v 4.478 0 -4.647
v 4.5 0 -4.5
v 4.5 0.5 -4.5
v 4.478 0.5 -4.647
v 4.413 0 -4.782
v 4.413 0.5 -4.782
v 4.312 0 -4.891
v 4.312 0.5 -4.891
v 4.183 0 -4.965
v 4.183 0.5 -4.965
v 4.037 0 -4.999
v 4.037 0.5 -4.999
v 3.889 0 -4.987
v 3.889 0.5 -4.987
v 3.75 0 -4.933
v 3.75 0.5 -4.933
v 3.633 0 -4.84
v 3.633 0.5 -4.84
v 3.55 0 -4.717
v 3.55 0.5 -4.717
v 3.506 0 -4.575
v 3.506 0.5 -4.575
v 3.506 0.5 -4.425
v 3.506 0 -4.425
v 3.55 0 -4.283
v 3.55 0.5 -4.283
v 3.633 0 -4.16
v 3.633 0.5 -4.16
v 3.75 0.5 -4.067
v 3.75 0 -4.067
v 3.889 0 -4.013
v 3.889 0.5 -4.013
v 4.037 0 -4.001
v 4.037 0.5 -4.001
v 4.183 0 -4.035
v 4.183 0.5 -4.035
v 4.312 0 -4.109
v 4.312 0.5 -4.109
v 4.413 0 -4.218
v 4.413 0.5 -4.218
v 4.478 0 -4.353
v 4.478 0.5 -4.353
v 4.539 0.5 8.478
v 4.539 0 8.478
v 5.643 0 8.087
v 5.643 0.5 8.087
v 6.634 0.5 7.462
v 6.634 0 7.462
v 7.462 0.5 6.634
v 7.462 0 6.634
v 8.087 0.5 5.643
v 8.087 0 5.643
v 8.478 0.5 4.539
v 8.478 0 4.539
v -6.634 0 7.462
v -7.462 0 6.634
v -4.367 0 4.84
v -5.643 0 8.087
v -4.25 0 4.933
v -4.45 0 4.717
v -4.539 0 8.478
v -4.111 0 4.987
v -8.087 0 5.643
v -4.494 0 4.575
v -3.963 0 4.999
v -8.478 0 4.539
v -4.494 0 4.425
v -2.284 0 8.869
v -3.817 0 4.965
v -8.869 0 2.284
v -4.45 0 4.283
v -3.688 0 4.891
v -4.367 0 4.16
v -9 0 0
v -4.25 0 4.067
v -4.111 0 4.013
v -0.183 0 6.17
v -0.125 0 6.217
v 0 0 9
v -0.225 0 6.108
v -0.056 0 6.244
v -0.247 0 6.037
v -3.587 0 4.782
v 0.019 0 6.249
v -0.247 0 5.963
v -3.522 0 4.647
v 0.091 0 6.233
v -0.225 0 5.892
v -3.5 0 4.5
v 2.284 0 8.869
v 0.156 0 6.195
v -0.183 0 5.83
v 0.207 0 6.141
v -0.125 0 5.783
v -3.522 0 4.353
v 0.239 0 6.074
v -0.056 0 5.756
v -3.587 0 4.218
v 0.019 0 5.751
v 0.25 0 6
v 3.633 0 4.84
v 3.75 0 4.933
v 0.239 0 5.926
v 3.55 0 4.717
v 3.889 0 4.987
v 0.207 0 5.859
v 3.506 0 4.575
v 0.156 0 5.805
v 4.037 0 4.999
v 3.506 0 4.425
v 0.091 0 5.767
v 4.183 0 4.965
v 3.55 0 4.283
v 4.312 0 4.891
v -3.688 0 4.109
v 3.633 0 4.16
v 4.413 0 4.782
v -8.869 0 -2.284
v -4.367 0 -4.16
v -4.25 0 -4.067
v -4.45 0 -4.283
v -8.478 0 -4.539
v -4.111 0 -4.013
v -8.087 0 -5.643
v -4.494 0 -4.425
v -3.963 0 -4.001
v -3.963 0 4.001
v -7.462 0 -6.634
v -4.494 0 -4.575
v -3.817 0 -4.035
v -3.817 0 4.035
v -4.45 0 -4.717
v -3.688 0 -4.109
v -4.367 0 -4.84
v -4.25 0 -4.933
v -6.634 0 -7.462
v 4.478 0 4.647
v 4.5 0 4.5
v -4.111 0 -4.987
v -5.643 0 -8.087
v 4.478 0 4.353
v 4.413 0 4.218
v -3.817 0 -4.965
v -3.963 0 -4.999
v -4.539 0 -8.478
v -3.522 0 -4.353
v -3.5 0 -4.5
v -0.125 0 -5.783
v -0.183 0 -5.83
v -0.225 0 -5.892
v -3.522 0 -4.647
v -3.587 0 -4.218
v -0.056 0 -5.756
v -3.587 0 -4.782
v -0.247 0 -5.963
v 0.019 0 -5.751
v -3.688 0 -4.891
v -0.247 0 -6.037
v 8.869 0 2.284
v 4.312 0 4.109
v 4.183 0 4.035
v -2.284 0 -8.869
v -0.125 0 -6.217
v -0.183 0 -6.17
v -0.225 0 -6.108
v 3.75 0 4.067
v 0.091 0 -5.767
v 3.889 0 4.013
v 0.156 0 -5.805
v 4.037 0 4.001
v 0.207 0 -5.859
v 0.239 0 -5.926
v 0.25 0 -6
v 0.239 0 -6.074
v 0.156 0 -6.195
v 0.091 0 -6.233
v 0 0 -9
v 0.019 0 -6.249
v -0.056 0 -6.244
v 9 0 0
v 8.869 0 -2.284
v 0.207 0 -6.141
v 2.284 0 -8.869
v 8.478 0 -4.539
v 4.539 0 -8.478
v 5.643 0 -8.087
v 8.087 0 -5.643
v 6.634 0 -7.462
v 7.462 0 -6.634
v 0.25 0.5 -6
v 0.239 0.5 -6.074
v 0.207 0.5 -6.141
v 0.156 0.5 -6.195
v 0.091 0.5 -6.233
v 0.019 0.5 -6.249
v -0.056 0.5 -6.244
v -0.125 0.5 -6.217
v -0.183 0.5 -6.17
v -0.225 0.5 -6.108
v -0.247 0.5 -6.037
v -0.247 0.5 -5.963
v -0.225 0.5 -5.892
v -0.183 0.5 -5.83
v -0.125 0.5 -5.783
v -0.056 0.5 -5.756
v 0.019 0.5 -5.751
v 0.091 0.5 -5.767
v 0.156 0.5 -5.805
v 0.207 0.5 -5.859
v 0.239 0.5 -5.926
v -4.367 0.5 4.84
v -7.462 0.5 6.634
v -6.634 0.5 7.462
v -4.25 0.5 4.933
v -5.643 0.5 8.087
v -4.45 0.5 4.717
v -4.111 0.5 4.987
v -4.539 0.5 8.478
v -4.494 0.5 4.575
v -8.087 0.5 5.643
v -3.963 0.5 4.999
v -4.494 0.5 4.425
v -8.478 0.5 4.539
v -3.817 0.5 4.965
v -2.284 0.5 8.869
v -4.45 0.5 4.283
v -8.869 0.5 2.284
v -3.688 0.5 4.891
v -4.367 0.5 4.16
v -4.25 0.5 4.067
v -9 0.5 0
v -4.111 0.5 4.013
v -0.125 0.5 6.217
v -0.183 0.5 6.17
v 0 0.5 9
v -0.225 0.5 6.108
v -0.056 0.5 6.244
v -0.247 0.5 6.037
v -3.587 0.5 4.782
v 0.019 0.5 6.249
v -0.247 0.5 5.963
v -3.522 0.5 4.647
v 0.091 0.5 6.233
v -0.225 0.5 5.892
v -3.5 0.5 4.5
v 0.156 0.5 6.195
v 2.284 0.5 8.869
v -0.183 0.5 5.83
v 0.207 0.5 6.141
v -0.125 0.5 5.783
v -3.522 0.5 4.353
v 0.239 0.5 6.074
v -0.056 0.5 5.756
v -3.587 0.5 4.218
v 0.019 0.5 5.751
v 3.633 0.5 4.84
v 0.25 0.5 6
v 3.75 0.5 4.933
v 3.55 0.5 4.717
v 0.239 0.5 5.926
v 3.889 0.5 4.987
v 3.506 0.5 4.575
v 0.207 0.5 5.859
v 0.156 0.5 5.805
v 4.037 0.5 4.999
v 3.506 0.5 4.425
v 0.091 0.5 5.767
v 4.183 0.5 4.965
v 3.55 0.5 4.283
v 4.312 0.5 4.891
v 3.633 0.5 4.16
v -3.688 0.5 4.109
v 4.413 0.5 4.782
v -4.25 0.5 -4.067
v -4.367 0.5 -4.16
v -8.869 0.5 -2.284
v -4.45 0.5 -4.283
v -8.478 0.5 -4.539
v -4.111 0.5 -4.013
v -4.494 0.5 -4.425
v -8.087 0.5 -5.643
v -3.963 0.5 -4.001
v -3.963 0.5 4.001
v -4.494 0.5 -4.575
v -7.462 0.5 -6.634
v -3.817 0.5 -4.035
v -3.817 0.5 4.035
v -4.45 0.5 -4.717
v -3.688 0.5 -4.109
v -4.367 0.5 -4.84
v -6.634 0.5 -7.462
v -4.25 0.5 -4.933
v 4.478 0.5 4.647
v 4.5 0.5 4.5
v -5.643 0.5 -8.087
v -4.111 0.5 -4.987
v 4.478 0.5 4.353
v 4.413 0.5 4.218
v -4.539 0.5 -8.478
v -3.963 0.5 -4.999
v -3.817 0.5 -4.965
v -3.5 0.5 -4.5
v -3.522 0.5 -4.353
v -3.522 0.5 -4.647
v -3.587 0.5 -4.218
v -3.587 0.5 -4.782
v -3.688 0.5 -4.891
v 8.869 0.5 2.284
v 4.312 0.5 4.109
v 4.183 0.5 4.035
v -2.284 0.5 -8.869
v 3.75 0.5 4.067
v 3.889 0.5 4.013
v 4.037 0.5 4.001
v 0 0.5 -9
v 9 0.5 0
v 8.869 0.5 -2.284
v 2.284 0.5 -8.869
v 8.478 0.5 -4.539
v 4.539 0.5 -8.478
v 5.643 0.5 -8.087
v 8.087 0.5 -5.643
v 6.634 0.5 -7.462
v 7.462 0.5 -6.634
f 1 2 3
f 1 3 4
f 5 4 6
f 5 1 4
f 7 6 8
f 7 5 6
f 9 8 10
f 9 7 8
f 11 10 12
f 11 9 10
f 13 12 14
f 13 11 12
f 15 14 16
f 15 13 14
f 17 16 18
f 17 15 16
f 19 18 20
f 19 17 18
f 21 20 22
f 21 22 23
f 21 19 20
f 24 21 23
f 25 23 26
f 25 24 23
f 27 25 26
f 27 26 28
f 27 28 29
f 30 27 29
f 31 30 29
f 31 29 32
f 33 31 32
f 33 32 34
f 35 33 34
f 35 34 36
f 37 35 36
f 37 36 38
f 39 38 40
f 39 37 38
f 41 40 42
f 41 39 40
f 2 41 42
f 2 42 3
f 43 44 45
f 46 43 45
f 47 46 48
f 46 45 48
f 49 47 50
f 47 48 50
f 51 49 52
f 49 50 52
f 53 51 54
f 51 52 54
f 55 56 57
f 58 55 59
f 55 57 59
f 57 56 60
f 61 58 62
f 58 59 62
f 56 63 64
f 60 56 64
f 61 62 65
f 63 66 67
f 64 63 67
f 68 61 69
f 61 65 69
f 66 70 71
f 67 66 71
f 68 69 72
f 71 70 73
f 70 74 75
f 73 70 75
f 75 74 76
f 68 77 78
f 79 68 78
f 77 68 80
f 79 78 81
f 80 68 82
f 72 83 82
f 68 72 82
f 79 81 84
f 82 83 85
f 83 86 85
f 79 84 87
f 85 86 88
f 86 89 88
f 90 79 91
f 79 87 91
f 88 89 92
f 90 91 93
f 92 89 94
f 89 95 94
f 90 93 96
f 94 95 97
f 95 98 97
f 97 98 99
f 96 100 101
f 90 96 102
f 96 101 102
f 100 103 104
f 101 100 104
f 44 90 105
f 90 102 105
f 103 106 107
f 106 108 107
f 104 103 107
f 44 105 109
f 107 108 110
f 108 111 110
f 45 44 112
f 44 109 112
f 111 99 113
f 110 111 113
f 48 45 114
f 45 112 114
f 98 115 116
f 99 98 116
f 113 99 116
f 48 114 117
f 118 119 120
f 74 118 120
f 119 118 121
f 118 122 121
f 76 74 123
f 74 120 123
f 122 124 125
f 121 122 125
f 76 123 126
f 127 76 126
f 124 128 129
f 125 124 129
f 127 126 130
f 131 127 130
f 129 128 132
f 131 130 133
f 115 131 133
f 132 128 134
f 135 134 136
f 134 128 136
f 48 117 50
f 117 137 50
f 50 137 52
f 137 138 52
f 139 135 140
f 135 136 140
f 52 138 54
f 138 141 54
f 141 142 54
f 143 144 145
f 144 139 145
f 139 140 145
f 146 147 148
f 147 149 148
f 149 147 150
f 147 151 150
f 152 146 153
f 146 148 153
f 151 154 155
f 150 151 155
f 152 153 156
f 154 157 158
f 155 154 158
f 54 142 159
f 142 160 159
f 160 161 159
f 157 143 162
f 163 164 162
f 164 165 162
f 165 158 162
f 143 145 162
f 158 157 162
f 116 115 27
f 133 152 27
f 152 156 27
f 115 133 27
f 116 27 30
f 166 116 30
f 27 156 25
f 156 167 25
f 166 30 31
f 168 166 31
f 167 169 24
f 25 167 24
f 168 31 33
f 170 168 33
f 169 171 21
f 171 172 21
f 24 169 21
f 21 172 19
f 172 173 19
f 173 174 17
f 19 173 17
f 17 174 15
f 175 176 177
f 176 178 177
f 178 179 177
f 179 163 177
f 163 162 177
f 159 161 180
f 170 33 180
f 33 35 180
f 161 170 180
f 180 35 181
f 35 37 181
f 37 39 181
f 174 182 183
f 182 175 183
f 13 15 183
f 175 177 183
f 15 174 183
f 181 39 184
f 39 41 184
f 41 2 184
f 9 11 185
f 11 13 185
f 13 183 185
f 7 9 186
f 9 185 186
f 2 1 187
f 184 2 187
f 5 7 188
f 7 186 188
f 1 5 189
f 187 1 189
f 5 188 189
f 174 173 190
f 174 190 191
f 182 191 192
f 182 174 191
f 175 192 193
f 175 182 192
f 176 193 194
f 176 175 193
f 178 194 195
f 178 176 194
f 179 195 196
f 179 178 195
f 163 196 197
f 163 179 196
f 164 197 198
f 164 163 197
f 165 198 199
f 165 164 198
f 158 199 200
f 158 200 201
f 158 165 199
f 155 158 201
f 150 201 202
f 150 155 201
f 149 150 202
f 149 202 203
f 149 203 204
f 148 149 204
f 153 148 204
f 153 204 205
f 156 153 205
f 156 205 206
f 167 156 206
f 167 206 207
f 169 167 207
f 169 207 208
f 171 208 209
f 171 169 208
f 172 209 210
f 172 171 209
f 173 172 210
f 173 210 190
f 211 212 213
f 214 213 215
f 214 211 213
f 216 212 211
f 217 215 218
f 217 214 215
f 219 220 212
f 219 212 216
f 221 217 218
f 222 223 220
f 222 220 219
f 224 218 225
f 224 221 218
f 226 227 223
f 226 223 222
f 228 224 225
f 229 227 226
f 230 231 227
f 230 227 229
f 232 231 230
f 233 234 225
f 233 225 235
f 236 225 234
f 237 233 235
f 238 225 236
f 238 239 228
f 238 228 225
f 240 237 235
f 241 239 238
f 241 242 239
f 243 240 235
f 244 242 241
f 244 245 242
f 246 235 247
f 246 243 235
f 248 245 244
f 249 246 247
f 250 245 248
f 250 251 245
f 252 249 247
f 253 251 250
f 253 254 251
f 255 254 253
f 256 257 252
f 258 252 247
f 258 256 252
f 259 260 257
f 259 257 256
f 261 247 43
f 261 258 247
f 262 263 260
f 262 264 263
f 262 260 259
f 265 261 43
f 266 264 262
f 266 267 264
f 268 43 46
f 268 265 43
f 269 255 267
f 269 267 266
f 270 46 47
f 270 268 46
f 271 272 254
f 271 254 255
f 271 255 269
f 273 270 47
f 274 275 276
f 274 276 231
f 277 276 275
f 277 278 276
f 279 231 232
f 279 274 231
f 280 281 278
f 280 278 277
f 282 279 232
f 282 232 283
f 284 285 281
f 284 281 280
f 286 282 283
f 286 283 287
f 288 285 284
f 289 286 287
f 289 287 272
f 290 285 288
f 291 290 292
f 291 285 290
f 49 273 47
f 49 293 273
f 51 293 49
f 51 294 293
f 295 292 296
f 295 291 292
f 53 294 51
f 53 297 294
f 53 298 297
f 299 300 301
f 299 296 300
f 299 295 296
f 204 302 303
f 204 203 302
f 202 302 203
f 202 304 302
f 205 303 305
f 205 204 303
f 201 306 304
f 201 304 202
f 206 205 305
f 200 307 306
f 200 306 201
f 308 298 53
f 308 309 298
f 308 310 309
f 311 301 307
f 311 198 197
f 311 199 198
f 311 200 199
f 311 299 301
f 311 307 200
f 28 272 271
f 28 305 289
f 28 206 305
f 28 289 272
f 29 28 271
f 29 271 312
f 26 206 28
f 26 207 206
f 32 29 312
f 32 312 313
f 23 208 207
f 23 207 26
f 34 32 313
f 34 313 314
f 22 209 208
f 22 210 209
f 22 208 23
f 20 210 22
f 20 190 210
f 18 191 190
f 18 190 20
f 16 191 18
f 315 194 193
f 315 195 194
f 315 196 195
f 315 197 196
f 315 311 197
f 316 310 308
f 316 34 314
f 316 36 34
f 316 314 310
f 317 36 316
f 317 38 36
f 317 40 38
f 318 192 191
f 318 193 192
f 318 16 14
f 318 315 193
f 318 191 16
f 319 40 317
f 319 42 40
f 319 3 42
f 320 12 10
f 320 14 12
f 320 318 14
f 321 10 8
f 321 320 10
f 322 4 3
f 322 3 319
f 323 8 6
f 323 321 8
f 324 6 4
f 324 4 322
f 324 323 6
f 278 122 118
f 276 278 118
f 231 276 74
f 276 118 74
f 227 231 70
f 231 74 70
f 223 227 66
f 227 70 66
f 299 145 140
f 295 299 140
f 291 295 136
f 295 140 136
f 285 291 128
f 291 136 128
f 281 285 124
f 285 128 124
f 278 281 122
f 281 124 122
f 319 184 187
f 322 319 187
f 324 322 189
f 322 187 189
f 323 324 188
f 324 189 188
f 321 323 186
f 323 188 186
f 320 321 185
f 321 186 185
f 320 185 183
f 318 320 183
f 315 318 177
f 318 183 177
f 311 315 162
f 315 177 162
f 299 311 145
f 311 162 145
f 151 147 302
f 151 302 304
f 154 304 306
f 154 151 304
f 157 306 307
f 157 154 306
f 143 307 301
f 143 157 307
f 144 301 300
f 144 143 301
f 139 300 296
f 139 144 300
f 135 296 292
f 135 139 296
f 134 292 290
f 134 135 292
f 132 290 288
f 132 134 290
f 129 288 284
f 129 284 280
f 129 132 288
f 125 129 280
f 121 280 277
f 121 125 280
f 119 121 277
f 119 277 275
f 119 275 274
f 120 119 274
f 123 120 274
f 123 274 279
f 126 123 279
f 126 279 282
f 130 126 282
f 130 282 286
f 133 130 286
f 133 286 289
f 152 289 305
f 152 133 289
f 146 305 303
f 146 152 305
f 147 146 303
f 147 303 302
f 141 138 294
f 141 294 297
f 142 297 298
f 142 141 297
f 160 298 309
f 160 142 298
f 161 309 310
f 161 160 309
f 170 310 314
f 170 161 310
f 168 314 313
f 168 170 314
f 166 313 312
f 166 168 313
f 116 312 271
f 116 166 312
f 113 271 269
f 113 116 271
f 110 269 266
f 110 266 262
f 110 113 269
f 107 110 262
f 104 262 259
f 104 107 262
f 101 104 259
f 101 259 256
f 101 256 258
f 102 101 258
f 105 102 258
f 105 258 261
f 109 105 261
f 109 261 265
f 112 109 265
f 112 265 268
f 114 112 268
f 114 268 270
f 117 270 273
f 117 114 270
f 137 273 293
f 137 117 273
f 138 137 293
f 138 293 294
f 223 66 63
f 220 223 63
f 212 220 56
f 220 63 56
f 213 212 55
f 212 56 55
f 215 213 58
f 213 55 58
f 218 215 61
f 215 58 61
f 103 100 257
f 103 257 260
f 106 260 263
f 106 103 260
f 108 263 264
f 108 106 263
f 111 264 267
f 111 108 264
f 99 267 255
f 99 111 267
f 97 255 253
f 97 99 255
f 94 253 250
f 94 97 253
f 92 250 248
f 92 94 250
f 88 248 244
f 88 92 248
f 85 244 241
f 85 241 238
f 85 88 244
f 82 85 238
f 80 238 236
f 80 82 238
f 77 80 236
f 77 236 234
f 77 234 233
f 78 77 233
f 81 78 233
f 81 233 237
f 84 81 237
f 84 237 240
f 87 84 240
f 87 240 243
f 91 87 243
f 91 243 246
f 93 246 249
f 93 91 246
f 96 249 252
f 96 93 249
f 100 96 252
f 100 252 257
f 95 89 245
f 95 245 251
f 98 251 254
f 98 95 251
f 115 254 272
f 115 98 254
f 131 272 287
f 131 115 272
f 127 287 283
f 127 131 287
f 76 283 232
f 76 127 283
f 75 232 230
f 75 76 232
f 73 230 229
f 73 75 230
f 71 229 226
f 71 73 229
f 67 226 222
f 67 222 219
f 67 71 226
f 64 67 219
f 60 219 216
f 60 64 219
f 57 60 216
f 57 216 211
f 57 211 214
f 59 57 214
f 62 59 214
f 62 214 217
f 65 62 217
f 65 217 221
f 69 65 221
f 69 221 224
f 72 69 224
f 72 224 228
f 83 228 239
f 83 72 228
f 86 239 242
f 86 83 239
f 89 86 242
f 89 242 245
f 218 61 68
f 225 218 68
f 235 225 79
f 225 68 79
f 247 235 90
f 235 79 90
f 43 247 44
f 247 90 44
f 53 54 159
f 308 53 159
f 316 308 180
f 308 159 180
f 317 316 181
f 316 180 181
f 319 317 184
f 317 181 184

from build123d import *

# Parameters (mm, degrees)
SKETCH1_R      = 0.5
SKETCH1_R_2    = 0.25
EXTRUDE1_DEPTH = 0.5


with BuildPart() as part:
    # Sketch1 → Extrude1 (new body)
    with BuildSketch(Plane(origin=(0, 0, 0), x_dir=(1, 0, 0), z_dir=(0, 1, 0))):
        with BuildLine():
            ThreePointArc((8.478240258, -4.538519193), (9, 0), (8.478240258, 4.538519193))
            ThreePointArc((8.478240258, 4.538519193), (7.071067812, 7.071067812), (4.538519193, 8.478240258))
            ThreePointArc((4.538519193, 8.478240258), (0, 9), (-4.538519193, 8.478240258))
            ThreePointArc((-4.538519193, 8.478240258), (-7.071067812, 7.071067812), (-8.478240258, 4.538519193))
            ThreePointArc((-8.478240258, 4.538519193), (-9, 0), (-8.478240258, -4.538519193))
            ThreePointArc((-8.478240258, -4.538519193), (-7.071067812, -7.071067812), (-4.538519193, -8.478240258))
            ThreePointArc((-4.538519193, -8.478240258), (0, -9), (4.538519193, -8.478240258))
            ThreePointArc((4.538519193, -8.478240258), (7.071067812, -7.071067812), (8.478240258, -4.538519193))
        make_face()
        with Locations((4, 4.5)):
            Circle(SKETCH1_R, mode=Mode.SUBTRACT)
        with Locations((-4, 4.5)):
            Circle(SKETCH1_R, mode=Mode.SUBTRACT)
        with Locations((4, -4.5)):
            Circle(SKETCH1_R, mode=Mode.SUBTRACT)
        with Locations((-4, -4.5)):
            Circle(SKETCH1_R, mode=Mode.SUBTRACT)
        with Locations((0, 6)):
            Circle(SKETCH1_R_2, mode=Mode.SUBTRACT)
        with Locations((0, -6)):
            Circle(SKETCH1_R_2, mode=Mode.SUBTRACT)
    extrude(amount=EXTRUDE1_DEPTH)


solid = part.part
